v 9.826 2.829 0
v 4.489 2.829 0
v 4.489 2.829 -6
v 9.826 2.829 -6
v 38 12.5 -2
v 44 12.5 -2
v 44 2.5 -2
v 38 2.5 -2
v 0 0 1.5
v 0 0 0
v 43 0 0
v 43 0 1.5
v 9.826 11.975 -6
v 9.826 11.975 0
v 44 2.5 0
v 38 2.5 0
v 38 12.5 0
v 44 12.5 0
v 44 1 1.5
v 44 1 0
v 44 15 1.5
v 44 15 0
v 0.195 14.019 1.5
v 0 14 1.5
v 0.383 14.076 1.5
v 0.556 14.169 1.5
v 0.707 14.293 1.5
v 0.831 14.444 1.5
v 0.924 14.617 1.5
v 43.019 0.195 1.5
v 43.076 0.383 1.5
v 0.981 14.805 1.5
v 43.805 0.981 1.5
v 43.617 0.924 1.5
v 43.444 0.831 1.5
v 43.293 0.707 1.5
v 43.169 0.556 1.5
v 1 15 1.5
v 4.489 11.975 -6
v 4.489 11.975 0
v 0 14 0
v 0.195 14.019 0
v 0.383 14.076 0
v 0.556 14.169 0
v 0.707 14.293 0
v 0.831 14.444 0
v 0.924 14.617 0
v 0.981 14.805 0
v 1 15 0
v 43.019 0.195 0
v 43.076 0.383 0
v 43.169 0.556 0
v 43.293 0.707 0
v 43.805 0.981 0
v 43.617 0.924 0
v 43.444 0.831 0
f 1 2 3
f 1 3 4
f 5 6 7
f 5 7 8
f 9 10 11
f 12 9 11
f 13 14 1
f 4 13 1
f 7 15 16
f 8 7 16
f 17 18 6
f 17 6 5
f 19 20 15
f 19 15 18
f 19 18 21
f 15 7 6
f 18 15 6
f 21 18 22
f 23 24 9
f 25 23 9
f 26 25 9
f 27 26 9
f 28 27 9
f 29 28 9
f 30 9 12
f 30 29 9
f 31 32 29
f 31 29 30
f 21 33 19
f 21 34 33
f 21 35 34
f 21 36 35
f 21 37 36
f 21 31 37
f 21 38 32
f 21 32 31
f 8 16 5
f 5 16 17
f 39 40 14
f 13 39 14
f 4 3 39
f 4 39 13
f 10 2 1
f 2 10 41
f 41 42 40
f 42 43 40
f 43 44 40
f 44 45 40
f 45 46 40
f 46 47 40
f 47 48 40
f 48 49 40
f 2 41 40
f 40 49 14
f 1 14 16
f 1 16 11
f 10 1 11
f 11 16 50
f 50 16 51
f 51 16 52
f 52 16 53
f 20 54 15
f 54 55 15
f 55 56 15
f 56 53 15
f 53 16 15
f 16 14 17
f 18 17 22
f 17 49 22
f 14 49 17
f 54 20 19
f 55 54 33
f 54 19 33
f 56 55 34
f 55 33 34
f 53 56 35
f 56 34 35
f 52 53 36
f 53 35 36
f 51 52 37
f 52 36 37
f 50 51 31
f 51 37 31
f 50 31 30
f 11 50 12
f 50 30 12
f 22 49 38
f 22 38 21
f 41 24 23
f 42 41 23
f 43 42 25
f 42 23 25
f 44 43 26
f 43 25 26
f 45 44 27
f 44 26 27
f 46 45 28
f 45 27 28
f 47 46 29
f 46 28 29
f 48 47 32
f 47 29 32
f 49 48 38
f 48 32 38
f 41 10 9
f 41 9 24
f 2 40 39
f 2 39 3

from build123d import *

# Parameters (mm, degrees)
ESQUISSE1_W         = 44
ESQUISSE1_H         = 15
BOSS_EXTRU_1_DEPTH  = 1.5
ESQUISSE2_W         = 6
ESQUISSE2_H         = 10
BOSS_EXTRU_2_DEPTH  = 2
CUT_EXTRUDE1_REACH  = 48.618
SKETCH1_R           = 1
SKETCH2_W           = 5.336665058
SKETCH2_H           = 9.146011637
BOSS_EXTRUDE1_DEPTH = 6


with BuildPart() as part:
    # Esquisse1 → Boss.-Extru.1 (new body)
    with BuildSketch(Plane.XY):
        with Locations((22, 7.5)):
            Rectangle(ESQUISSE1_W, ESQUISSE1_H)
    extrude(amount=BOSS_EXTRU_1_DEPTH)

    # Esquisse2 → Boss.-Extru.2 (add)
    with BuildSketch(Plane(origin=(0, 0, 0), x_dir=(-1, 0, 0), z_dir=(0, 0, -1))):
        with Locations((-41, 7.5)):
            Rectangle(ESQUISSE2_W, ESQUISSE2_H)
    extrude(amount=BOSS_EXTRU_2_DEPTH)

    # Sketch1 → Cut-Extrude1 (cut, up to next)
    with BuildSketch(Plane.XY.offset(1.5), mode=Mode.PRIVATE) as cut_extrude1_sk1:
        with Locations((44, 0)):
            Circle(SKETCH1_R)
    cut_extrude1_tool1 = extrude(cut_extrude1_sk1.sketch, amount=-CUT_EXTRUDE1_REACH, mode=Mode.PRIVATE) & part.part
    # Sketch1 → Cut-Extrude1 (cut, up to next)
    with BuildSketch(Plane.XY.offset(1.5), mode=Mode.PRIVATE) as cut_extrude1_sk2:
        with Locations((0, 15)):
            Circle(SKETCH1_R)
    cut_extrude1_tool2 = extrude(cut_extrude1_sk2.sketch, amount=-CUT_EXTRUDE1_REACH, mode=Mode.PRIVATE) & part.part
    add(cut_extrude1_tool1.solids().sort_by_distance((44, 0, 1.5))[0], mode=Mode.SUBTRACT)
    add(cut_extrude1_tool2.solids().sort_by_distance((0, 15, 1.5))[0], mode=Mode.SUBTRACT)

    # Sketch2 → Boss-Extrude1 (add)
    with BuildSketch(Plane(origin=(0, 0, 0), x_dir=(1, 0, 0), z_dir=(0, 0, -1))):
        with Locations((7.157544366, -7.402304661)):
            Rectangle(SKETCH2_W, SKETCH2_H)
    extrude(amount=BOSS_EXTRUDE1_DEPTH)


solid = part.part
